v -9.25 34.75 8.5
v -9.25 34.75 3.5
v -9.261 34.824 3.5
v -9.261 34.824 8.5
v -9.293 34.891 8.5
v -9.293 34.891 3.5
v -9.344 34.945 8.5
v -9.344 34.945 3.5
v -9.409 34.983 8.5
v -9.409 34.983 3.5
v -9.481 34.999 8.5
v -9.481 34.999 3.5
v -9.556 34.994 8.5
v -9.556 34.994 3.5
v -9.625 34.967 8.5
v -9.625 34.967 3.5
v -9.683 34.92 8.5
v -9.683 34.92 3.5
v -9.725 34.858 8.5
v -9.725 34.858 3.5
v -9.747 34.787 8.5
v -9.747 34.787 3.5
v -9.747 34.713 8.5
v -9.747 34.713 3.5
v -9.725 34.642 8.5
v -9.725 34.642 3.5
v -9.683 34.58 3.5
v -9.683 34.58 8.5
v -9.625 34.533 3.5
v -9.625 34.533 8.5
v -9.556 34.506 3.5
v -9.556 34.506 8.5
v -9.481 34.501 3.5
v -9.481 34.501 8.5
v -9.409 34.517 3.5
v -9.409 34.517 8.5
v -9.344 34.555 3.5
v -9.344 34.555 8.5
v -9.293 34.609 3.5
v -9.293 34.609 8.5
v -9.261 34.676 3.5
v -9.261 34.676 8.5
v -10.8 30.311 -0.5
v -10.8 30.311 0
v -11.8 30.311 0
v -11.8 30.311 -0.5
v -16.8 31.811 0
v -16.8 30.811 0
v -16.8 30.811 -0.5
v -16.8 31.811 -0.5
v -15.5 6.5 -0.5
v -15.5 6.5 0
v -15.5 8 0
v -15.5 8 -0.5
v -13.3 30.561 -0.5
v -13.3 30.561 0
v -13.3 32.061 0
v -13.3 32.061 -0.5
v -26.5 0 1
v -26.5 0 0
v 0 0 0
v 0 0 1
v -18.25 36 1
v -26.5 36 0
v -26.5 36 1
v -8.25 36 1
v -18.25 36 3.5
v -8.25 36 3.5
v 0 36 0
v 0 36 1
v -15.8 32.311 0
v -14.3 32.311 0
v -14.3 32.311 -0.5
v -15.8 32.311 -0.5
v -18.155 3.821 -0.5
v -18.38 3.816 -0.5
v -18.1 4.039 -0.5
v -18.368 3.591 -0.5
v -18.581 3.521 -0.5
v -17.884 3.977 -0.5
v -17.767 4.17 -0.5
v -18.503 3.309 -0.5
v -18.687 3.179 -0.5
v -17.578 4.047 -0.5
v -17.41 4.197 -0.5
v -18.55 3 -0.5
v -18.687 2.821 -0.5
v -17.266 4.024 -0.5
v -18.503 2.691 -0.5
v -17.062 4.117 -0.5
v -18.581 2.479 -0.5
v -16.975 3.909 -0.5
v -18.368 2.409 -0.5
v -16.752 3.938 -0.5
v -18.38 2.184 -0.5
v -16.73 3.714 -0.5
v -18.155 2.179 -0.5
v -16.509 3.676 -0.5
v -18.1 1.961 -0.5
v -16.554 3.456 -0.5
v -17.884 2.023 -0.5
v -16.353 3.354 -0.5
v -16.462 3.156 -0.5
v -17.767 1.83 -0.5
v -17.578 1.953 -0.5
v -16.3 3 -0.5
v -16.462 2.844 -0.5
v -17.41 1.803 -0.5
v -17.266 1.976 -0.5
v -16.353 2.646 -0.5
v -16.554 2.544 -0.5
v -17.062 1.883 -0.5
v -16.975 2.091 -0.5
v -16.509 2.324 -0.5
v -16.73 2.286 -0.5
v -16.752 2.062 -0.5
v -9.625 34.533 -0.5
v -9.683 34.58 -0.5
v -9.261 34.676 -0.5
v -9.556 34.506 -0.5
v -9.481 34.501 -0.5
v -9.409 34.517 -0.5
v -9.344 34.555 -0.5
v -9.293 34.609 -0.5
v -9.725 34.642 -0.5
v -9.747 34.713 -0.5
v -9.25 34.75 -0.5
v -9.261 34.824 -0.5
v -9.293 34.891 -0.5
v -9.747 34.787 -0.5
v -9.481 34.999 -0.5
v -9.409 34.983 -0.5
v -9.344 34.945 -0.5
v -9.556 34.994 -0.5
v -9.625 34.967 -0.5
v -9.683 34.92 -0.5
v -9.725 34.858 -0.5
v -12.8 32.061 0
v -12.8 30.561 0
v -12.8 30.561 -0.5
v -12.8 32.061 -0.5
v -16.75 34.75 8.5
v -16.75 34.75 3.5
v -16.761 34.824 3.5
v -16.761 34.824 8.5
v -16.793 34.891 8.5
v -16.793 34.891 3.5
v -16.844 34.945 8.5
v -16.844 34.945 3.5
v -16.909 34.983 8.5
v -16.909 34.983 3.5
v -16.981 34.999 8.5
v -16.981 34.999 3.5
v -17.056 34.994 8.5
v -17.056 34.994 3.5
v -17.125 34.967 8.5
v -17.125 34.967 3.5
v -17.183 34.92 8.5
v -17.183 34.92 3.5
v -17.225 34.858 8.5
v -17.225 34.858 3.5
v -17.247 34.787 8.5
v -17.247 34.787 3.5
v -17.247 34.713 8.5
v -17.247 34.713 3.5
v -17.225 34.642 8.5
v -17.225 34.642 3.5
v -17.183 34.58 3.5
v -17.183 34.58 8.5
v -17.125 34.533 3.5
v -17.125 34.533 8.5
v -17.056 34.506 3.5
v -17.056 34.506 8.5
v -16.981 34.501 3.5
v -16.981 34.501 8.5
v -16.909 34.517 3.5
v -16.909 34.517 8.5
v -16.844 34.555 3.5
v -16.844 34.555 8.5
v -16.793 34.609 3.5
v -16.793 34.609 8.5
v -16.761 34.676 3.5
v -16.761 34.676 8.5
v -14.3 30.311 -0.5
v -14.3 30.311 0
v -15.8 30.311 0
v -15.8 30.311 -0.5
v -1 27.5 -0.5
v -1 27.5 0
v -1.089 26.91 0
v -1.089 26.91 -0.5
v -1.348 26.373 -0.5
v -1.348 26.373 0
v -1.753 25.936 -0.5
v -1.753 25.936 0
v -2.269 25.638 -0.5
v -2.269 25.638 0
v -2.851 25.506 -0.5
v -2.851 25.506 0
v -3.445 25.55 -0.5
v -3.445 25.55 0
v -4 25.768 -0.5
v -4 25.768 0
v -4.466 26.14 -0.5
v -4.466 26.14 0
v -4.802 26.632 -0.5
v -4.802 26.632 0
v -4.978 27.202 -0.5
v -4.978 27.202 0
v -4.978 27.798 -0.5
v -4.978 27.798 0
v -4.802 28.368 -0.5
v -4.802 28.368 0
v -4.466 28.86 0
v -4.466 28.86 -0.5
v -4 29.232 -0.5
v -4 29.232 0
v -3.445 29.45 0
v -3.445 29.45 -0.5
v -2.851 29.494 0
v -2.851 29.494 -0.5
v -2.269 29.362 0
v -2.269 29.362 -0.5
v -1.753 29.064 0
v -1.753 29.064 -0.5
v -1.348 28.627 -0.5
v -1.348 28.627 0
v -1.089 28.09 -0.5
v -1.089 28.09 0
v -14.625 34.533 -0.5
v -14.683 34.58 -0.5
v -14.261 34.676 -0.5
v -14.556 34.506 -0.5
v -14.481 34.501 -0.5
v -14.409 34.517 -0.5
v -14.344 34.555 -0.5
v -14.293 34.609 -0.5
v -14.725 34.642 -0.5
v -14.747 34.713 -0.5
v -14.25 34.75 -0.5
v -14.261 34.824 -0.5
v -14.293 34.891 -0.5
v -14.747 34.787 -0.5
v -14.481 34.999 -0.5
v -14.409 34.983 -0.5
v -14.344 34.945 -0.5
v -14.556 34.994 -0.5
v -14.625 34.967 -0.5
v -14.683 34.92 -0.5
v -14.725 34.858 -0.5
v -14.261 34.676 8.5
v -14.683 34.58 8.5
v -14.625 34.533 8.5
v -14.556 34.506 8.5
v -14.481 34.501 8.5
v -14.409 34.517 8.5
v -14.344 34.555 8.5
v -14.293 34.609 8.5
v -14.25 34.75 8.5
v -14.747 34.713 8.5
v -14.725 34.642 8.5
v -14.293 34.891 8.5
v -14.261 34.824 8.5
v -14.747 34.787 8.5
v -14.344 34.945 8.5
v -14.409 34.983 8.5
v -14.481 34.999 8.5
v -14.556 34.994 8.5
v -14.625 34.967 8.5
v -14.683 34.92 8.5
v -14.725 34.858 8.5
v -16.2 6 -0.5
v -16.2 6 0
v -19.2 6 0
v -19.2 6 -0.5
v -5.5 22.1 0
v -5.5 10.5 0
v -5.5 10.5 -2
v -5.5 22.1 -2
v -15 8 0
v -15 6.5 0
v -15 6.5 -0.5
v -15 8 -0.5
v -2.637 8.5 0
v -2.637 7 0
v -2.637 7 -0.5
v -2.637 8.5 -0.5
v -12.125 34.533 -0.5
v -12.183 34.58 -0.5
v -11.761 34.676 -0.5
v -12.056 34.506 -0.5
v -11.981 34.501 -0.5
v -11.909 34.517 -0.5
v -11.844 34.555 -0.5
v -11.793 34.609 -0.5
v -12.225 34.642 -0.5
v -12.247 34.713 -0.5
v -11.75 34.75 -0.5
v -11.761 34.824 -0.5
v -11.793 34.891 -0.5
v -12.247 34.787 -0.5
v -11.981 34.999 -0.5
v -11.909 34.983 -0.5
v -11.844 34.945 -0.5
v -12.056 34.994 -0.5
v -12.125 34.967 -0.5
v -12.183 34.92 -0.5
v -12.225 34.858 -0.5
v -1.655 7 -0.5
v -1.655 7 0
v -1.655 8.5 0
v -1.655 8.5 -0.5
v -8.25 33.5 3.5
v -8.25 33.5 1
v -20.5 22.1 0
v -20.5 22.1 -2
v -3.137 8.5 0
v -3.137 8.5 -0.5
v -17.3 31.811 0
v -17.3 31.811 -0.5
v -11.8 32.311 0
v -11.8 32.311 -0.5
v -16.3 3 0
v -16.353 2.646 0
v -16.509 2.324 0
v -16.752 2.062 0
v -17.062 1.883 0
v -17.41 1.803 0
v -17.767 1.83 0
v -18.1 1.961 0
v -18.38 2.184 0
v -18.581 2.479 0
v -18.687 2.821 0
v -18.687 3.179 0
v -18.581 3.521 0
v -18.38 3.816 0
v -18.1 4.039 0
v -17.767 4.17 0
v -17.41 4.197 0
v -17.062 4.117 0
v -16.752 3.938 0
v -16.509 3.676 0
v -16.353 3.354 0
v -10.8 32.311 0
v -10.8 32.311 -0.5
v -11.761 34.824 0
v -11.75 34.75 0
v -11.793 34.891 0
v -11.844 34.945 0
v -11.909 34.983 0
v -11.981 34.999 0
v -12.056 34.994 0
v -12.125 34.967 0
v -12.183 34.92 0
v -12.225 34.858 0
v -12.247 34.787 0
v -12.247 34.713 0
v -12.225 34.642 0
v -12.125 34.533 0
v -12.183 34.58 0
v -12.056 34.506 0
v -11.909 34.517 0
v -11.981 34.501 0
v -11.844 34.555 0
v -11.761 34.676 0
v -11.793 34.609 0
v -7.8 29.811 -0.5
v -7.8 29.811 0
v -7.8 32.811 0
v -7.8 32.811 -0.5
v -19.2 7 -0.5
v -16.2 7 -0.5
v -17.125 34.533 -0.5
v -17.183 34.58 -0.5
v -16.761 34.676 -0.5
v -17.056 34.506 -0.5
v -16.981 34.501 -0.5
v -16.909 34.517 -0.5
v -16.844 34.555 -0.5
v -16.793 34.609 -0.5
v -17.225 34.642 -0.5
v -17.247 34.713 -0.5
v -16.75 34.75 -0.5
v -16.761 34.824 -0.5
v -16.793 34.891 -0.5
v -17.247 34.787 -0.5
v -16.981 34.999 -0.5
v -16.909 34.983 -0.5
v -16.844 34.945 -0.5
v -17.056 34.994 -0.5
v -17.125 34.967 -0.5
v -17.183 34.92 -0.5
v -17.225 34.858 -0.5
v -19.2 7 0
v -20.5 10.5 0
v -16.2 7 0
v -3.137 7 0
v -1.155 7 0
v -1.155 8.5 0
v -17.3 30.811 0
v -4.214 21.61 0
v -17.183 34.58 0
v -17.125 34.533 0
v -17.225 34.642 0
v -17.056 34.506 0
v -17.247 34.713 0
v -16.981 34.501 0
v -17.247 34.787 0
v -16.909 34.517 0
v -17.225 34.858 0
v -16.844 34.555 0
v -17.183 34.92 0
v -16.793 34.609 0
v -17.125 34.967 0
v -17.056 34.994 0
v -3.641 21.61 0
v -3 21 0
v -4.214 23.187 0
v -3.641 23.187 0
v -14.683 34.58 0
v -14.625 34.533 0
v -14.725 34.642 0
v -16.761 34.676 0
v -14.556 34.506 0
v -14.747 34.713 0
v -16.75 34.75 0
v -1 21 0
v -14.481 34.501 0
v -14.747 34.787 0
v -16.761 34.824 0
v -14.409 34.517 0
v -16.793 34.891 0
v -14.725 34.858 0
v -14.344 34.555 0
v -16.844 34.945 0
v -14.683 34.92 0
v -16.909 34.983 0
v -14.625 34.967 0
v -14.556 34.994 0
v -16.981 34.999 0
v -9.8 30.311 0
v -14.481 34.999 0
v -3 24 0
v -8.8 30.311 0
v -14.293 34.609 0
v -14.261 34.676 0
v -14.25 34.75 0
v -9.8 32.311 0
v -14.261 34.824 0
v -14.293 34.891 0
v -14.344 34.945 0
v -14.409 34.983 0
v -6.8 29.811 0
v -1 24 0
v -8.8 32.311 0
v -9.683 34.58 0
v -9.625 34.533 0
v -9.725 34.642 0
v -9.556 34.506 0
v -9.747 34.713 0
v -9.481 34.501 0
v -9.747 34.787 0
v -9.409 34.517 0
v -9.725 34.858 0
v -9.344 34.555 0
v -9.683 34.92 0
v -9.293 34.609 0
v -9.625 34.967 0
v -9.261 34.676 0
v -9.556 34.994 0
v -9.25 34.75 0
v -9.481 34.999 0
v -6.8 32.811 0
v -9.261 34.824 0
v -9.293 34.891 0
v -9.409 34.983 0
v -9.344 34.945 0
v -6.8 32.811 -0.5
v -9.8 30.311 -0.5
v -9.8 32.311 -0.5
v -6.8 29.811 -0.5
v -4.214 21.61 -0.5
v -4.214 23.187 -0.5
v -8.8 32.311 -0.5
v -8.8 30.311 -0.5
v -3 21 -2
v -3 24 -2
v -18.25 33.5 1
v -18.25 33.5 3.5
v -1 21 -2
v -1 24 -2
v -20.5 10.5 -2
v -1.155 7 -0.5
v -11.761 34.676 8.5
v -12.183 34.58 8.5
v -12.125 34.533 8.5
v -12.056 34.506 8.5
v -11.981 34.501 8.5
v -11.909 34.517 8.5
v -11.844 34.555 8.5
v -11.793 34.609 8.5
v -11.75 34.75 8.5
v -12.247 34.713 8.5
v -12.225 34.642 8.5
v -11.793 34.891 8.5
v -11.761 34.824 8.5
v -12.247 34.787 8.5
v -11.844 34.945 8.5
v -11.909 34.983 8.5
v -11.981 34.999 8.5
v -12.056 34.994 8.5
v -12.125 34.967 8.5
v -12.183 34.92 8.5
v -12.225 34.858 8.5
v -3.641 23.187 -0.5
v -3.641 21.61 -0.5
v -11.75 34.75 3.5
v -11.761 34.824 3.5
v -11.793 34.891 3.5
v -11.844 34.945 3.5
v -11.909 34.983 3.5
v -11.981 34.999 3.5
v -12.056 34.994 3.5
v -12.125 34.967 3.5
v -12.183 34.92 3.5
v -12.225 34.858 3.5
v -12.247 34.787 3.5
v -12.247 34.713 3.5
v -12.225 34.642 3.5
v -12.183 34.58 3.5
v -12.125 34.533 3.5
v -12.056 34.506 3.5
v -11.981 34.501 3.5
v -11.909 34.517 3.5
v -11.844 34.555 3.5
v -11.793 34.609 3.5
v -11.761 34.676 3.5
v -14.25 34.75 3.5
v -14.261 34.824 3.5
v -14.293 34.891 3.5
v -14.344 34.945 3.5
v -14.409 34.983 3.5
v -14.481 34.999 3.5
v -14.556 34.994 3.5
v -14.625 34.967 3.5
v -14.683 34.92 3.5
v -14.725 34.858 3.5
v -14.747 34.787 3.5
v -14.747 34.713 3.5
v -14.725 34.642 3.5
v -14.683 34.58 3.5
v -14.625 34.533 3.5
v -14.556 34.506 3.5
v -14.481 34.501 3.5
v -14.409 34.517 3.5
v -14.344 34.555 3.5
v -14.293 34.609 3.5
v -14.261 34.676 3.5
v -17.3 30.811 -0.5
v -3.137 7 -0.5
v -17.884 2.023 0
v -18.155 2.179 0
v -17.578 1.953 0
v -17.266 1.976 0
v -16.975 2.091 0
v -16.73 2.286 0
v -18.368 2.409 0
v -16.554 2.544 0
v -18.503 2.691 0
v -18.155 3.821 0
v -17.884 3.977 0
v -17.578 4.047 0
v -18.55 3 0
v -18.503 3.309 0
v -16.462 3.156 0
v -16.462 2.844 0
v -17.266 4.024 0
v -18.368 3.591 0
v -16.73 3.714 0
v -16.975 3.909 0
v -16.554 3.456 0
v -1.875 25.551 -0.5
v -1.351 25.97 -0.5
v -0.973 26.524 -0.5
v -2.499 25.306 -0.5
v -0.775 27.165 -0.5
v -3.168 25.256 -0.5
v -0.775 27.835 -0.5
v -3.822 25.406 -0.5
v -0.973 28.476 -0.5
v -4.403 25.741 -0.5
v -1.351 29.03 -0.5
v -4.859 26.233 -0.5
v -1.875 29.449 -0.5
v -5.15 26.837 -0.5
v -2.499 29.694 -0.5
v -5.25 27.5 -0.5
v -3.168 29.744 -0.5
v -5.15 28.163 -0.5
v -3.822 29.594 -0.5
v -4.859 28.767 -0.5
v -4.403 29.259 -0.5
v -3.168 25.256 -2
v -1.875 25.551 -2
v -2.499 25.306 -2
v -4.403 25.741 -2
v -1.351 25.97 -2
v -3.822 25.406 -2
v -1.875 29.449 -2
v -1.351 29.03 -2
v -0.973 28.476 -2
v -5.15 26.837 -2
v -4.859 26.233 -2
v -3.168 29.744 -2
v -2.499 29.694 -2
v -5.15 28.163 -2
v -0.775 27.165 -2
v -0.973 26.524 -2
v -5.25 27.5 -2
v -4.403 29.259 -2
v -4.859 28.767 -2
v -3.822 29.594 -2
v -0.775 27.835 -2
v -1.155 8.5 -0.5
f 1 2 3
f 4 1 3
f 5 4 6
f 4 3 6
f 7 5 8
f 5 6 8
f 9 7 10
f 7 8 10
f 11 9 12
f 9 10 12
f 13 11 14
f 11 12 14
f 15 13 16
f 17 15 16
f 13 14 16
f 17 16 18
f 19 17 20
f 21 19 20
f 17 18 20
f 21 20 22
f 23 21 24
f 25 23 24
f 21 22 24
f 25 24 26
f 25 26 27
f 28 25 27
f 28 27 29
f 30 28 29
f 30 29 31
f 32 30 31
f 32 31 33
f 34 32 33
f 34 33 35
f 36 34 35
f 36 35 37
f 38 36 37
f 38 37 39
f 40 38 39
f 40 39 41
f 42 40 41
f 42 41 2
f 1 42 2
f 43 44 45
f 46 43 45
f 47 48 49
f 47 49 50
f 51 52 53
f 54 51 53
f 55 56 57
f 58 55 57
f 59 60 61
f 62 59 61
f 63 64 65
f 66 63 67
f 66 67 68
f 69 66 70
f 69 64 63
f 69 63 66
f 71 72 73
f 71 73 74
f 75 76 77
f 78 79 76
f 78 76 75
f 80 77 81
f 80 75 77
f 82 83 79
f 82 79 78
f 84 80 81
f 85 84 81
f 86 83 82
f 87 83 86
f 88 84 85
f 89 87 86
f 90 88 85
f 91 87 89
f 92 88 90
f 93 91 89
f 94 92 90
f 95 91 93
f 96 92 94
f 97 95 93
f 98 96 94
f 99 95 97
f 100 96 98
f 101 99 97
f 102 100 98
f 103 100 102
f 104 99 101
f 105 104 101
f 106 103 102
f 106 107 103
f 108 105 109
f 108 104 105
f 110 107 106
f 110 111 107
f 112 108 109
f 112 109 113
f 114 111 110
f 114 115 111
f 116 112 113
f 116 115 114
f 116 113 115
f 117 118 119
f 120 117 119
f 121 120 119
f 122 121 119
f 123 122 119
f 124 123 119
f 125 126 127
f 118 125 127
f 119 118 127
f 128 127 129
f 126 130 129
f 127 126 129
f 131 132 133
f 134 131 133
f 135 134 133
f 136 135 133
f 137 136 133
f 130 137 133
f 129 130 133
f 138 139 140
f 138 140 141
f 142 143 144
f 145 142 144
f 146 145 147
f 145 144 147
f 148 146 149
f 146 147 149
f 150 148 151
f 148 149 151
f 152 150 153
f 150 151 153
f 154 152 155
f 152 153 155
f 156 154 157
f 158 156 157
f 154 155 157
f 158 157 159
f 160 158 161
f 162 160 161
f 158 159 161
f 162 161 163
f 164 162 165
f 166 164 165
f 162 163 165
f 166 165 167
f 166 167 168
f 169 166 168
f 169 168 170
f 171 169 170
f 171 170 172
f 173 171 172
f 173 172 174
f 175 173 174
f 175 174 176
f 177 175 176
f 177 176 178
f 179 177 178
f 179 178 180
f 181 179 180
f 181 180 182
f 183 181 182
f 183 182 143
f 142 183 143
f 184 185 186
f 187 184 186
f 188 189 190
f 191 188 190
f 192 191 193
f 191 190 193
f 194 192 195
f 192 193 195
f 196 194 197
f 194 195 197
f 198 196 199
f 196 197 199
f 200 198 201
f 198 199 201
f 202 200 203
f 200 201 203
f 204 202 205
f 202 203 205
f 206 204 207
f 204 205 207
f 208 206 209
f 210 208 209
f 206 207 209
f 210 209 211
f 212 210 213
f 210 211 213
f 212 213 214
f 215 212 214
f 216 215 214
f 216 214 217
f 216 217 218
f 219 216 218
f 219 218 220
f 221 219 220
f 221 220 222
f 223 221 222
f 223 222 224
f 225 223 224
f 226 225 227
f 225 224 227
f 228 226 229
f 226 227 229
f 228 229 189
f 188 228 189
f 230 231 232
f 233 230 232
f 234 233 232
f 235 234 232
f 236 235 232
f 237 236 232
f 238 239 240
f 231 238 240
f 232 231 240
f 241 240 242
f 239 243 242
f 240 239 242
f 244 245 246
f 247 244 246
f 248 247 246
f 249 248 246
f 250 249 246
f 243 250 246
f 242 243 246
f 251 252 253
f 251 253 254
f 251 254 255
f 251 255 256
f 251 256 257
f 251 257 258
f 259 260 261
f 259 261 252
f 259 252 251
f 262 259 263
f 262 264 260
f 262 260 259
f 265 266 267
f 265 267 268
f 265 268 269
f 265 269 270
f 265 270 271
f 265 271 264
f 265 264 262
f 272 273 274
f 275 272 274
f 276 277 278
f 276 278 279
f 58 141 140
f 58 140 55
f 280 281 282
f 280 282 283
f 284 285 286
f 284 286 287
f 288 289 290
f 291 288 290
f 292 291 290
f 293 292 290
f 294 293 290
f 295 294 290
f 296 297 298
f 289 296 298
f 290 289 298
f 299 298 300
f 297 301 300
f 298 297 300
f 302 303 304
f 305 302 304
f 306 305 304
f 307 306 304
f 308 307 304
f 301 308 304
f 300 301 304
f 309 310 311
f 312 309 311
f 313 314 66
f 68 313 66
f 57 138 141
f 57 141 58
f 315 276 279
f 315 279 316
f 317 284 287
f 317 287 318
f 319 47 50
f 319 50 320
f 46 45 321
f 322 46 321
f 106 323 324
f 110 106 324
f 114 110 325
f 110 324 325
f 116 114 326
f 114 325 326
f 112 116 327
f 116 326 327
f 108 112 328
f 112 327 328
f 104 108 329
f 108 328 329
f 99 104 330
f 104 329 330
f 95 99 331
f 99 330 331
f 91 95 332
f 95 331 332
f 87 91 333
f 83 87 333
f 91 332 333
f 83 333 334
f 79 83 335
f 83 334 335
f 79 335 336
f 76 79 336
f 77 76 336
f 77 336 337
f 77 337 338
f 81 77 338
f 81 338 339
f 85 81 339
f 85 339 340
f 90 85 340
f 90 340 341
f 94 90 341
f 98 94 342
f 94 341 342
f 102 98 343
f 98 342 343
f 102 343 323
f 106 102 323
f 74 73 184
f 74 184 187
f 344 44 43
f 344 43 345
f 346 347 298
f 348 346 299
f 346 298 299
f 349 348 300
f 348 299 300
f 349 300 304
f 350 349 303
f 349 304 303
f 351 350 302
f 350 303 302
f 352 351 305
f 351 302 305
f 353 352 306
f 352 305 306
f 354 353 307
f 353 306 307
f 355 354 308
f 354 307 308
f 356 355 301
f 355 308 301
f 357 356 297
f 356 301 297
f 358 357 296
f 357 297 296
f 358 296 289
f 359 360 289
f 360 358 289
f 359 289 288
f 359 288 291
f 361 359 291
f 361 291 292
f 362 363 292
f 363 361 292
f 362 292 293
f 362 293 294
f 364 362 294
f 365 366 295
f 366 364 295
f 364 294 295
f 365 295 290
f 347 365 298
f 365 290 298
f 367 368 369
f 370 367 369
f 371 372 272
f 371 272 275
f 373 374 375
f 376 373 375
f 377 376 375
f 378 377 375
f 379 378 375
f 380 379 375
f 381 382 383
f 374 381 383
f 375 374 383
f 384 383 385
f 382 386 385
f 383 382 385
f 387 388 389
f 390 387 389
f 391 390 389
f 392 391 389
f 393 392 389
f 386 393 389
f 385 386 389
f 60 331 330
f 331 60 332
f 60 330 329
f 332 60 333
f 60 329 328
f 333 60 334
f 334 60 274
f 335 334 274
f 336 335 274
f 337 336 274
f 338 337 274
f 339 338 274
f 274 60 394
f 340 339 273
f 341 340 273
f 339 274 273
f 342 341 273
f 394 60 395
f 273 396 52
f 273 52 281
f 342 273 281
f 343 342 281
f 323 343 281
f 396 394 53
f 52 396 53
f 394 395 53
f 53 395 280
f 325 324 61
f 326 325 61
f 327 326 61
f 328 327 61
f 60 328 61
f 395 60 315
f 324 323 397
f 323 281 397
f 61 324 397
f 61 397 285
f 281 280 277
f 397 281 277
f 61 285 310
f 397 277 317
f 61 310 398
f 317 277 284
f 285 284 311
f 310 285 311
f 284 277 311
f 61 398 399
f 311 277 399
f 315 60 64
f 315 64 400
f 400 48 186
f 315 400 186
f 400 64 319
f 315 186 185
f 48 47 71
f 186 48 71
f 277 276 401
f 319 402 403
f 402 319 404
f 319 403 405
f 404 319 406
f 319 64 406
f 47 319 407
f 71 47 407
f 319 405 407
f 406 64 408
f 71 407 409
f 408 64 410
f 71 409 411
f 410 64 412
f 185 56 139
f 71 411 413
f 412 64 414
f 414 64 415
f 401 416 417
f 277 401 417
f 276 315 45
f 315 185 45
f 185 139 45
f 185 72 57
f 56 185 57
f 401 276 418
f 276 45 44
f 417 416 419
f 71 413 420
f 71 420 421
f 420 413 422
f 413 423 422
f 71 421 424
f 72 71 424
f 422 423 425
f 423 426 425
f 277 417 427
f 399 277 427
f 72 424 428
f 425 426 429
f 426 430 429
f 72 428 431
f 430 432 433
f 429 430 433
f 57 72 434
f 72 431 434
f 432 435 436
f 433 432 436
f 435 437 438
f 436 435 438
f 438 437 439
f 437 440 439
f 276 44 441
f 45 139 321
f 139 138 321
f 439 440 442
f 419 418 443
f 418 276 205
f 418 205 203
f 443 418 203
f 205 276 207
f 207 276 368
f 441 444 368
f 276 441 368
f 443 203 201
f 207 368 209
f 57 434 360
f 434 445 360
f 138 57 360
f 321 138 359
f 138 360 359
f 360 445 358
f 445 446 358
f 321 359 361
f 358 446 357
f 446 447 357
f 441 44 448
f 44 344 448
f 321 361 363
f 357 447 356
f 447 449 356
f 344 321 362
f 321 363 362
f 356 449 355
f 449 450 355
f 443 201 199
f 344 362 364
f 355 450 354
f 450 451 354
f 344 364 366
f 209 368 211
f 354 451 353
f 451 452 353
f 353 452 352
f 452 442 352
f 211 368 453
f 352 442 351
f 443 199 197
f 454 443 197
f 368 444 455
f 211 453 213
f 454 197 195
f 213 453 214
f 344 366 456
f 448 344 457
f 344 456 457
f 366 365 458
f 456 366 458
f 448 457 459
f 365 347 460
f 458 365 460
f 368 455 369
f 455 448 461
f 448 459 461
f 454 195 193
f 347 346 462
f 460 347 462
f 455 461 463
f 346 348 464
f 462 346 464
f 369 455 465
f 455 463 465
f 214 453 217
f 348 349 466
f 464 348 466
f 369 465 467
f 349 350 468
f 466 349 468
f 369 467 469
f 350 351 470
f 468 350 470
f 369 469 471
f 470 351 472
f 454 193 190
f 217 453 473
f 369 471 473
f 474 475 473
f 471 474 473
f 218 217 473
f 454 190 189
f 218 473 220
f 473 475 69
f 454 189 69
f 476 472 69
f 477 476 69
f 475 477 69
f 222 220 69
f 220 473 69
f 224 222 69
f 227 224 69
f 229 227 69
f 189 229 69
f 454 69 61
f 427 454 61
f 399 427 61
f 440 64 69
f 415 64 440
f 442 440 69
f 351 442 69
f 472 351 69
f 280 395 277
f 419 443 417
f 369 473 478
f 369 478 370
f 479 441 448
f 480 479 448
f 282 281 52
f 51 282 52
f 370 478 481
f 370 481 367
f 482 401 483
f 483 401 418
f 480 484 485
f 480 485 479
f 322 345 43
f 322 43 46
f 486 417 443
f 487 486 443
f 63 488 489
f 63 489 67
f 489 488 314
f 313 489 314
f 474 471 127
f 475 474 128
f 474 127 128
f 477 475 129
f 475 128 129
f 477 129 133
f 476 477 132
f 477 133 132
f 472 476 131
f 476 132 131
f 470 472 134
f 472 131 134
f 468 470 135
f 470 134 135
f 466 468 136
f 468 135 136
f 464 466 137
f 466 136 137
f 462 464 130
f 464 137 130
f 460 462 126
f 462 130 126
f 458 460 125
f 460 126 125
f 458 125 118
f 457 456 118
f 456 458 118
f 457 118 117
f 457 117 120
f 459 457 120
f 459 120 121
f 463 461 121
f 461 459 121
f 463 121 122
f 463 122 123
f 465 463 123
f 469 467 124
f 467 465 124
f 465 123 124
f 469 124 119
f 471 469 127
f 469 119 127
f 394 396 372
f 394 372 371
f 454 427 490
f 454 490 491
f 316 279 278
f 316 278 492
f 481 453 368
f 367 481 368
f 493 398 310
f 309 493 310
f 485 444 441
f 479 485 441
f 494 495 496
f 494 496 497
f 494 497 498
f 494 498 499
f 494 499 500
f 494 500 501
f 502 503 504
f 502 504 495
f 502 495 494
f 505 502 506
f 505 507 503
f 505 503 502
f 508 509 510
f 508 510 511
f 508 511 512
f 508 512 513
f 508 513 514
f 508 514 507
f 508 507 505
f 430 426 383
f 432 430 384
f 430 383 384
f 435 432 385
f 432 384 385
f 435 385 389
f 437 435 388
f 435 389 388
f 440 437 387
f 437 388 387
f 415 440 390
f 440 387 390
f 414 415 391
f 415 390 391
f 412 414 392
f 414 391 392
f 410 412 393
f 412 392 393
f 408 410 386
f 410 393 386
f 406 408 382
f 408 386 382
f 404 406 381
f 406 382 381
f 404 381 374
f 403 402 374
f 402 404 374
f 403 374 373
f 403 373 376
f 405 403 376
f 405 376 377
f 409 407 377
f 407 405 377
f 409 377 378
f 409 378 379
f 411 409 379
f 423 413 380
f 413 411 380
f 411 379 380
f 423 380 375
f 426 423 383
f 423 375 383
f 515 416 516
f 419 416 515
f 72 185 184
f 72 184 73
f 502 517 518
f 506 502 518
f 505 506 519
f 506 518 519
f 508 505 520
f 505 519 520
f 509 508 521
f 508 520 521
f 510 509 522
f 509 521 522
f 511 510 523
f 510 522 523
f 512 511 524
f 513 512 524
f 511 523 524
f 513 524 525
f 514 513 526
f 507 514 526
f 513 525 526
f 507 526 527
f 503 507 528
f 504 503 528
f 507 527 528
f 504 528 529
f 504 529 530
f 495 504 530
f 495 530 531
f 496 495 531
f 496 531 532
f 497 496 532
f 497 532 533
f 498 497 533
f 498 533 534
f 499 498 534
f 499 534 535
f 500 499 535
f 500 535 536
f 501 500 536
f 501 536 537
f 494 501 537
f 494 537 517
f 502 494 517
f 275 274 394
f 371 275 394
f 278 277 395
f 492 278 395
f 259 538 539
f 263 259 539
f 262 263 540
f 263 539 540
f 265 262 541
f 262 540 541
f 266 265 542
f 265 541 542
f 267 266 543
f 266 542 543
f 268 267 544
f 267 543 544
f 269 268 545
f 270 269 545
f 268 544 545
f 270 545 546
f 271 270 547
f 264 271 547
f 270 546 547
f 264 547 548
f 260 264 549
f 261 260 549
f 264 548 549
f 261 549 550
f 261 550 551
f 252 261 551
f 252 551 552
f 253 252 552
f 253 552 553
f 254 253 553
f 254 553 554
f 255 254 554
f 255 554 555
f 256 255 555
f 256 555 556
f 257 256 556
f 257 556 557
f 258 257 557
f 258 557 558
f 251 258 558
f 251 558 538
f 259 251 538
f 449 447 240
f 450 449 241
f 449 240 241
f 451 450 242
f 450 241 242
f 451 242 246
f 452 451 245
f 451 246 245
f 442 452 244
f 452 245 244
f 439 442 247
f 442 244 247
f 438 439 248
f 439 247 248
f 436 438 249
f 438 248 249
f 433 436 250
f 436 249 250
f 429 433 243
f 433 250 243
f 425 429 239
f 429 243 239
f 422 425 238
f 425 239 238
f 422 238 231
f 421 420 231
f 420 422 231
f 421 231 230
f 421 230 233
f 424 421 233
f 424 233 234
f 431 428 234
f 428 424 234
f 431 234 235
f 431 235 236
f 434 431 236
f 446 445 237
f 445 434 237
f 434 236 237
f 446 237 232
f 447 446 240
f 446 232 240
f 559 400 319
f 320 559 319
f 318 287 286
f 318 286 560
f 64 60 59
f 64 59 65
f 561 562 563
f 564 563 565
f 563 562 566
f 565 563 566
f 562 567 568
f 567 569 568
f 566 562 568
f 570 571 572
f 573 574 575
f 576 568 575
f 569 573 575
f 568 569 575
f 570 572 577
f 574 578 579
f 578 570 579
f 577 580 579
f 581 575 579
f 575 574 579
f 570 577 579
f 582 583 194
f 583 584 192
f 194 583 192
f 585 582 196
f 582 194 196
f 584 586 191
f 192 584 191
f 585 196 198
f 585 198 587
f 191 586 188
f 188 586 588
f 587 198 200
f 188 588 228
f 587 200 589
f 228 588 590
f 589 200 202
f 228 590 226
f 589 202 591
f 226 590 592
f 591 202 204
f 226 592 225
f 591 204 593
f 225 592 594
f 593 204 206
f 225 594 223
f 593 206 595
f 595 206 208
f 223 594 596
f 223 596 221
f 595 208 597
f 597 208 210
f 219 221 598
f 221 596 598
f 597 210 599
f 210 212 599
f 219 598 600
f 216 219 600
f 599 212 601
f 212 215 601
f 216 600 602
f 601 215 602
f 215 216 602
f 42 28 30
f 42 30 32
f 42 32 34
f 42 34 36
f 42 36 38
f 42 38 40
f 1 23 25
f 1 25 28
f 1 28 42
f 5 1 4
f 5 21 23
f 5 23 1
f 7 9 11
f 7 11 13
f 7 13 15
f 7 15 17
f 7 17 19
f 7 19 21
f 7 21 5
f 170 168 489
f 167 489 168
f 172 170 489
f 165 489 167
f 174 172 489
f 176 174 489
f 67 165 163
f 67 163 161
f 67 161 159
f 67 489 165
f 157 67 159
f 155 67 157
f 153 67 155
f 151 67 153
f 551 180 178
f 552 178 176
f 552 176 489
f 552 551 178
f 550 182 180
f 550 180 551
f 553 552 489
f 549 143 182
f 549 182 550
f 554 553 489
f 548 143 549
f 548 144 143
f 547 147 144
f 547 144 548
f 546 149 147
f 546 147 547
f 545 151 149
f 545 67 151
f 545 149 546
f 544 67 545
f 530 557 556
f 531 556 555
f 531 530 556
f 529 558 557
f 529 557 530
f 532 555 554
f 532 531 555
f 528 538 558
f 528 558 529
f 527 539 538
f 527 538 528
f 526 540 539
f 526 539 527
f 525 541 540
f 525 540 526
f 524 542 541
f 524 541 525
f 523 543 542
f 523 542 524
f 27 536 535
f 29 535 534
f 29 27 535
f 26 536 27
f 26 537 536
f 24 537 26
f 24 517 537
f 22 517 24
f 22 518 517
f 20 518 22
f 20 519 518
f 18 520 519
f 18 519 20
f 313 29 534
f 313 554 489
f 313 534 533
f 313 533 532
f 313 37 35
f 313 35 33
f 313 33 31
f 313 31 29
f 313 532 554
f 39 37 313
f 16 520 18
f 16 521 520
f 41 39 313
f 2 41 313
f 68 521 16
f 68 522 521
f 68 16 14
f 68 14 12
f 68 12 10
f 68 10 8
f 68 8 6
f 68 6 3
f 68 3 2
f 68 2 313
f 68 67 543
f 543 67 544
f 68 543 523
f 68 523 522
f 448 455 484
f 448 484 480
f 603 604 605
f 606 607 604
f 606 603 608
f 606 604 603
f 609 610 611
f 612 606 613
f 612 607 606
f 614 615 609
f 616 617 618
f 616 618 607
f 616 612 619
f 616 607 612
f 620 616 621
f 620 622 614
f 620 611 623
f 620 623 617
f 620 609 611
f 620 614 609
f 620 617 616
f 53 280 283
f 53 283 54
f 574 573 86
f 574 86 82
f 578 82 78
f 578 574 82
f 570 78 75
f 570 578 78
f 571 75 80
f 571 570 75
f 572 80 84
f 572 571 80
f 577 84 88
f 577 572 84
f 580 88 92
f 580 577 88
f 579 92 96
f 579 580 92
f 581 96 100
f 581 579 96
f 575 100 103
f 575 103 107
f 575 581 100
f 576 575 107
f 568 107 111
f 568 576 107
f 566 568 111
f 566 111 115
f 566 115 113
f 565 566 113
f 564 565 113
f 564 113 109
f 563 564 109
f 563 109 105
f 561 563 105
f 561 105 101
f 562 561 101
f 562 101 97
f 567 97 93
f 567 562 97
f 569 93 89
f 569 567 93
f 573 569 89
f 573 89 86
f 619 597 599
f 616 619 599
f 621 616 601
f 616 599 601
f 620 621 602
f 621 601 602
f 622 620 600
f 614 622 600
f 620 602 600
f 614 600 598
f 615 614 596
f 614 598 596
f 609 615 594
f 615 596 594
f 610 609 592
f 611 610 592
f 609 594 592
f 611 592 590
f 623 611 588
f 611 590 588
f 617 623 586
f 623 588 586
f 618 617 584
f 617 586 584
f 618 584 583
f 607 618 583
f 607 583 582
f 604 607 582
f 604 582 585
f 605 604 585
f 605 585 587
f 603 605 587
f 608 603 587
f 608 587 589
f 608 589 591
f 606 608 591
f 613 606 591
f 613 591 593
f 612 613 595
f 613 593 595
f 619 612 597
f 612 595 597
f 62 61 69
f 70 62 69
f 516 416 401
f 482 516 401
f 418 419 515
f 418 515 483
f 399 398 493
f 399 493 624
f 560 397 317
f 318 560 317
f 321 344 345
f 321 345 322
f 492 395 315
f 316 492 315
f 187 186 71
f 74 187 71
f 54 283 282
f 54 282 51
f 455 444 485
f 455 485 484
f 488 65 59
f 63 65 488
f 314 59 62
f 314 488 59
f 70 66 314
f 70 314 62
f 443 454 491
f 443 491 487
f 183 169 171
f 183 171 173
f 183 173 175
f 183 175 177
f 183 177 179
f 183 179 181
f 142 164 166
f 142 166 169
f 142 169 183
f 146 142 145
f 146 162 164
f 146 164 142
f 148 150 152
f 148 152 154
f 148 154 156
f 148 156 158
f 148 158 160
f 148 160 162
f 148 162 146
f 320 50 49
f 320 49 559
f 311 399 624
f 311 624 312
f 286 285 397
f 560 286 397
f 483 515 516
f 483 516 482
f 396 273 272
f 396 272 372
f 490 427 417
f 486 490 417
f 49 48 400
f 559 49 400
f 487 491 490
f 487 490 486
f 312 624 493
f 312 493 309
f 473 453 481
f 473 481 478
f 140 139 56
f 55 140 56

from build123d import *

# Parameters (mm, degrees)
ESQUISSE1_W             = 26.5
ESQUISSE1_H             = 36
BOSS_EXTRU_1_DEPTH      = 1
ESQUISSE2_W             = 10
ESQUISSE2_H             = 2.5
BOSS_EXTRU_2_DEPTH      = 2.5
BOSS_EXTRU_3_DEPTH      = 5
BOSS_EXTRU_3_DEPTH_BACK = 4
ESQUISSE3_R             = 0.25
ESQUISSE4_W             = 1
ESQUISSE4_H             = 3
ESQUISSE4_H_2           = 2
ESQUISSE4_W_2           = 0.5
ESQUISSE4_H_3           = 1.5
ESQUISSE4_W_3           = 1.5
ESQUISSE4_H_4           = 1
BOSS_EXTRU_4_DEPTH      = 0.5
ESQUISSE5_R             = 2
BOSS_EXTRU_5_DEPTH      = 0.5
ESQUISSE6_R             = 2.25
BOSS_EXTRU_6_DEPTH      = 1.5
ESQUISSE7_W             = 15
ESQUISSE7_H             = 11.6
ESQUISSE7_W_2           = 2
ESQUISSE7_H_2           = 3
BOSS_EXTRU_7_DEPTH      = 2
ESQUISSE8_R             = 1.2
ESQUISSE8_R_2           = 1.05
ESQUISSE8_W             = 0.573696965
ESQUISSE8_H             = 1.577666654
ESQUISSE8_W_2           = 0.5
ESQUISSE8_H_2           = 1.5
ESQUISSE8_W_3           = 3
ESQUISSE8_H_3           = 1
BOSS_EXTRU_8_DEPTH      = 0.5


with BuildPart() as part:
    # Esquisse1 → Boss.-Extru.1 (new body)
    with BuildSketch(Plane.XY):
        with Locations((-13.25, 18)):
            Rectangle(ESQUISSE1_W, ESQUISSE1_H)
    extrude(amount=BOSS_EXTRU_1_DEPTH)

    # Esquisse2 → Boss.-Extru.2 (add)
    with BuildSketch(Plane.XY.offset(1)):
        with Locations((-13.25, 34.75)):
            Rectangle(ESQUISSE2_W, ESQUISSE2_H)
    extrude(amount=BOSS_EXTRU_2_DEPTH)

    # Esquisse3 → Boss.-Extru.3 (add, two sides: drawn at the far end of the back side and taken through both)
    with BuildSketch(Plane.XY.offset(3.5).offset(-BOSS_EXTRU_3_DEPTH_BACK)):
        with Locations((-17, 34.75)):
            Circle(ESQUISSE3_R)
        with Locations((-14.5, 34.75)):
            Circle(ESQUISSE3_R)
        with Locations((-12, 34.75)):
            Circle(ESQUISSE3_R)
        with Locations((-9.5, 34.75)):
            Circle(ESQUISSE3_R)
    extrude(amount=BOSS_EXTRU_3_DEPTH + BOSS_EXTRU_3_DEPTH_BACK)

    # Esquisse4 → Boss.-Extru.4 (add)
    with BuildSketch(Plane(origin=(0, 0, 0), x_dir=(-1, 0, 0), z_dir=(0, 0, -1))):
        with Locations((7.3, 31.311243574)):
            Rectangle(ESQUISSE4_W, ESQUISSE4_H)
        with Locations((9.3, 31.311243574)):
            Rectangle(ESQUISSE4_W, ESQUISSE4_H_2)
        with Locations((11.3, 31.311243574)):
            Rectangle(ESQUISSE4_W, ESQUISSE4_H_2)
        with Locations((13.05, 31.311243574)):
            Rectangle(ESQUISSE4_W_2, ESQUISSE4_H_3)
        with Locations((15.05, 31.311243574)):
            Rectangle(ESQUISSE4_W_3, ESQUISSE4_H_2)
        with Locations((17.05, 31.311243574)):
            Rectangle(ESQUISSE4_W_2, ESQUISSE4_H_4)
    extrude(amount=BOSS_EXTRU_4_DEPTH)

    # Esquisse5 → Boss.-Extru.5 (add)
    with BuildSketch(Plane(origin=(0, 0, 0), x_dir=(-1, 0, 0), z_dir=(0, 0, -1))):
        with Locations(Location((3, 27.5, 0), (0, 0, 180))):
            Circle(ESQUISSE5_R)
    extrude(amount=BOSS_EXTRU_5_DEPTH)

    # Esquisse6 → Boss.-Extru.6 (add)
    with BuildSketch(Plane(origin=(0, 0, -0.5), x_dir=(-1, 0, 0), z_dir=(0, 0, -1))):
        with Locations((3, 27.5)):
            Circle(ESQUISSE6_R)
    extrude(amount=BOSS_EXTRU_6_DEPTH)

    # Esquisse7 → Boss.-Extru.7 (add)
    with BuildSketch(Plane(origin=(0, 0, 0), x_dir=(-1, 0, 0), z_dir=(0, 0, -1))):
        with Locations((13, 16.3)):
            Rectangle(ESQUISSE7_W, ESQUISSE7_H)
        with Locations((2, 22.5)):
            Rectangle(ESQUISSE7_W_2, ESQUISSE7_H_2)
    extrude(amount=BOSS_EXTRU_7_DEPTH)

    # Esquisse8 → Boss.-Extru.8 (add)
    # profile 1 of 6: a face of its own
    with BuildSketch(Plane(origin=(0, 0, 0), x_dir=(-1, 0, 0), z_dir=(0, 0, -1))):
        with Locations(Location((17.5, 3, 0), (0, 0, 180))):
            Circle(ESQUISSE8_R)
        with Locations((17.5, 3)):
            Circle(ESQUISSE8_R_2, mode=Mode.SUBTRACT)
    # profile 2 of 6: a face of its own
    with BuildSketch(Plane(origin=(0, 0, 0), x_dir=(-1, 0, 0), z_dir=(0, 0, -1))):
        with Locations((3.927424315, 22.3983434)):
            Rectangle(ESQUISSE8_W, ESQUISSE8_H)
    # profile 3 of 6: a face of its own
    with BuildSketch(Plane(origin=(0, 0, 0), x_dir=(-1, 0, 0), z_dir=(0, 0, -1))):
        with Locations((1.404555649, 7.75)):
            Rectangle(ESQUISSE8_W_2, ESQUISSE8_H_2)
    # profile 4 of 6: a face of its own
    with BuildSketch(Plane(origin=(0, 0, 0), x_dir=(-1, 0, 0), z_dir=(0, 0, -1))):
        with Locations((2.886606143, 7.75)):
            Rectangle(ESQUISSE8_W_2, ESQUISSE8_H_2)
    # profile 5 of 6: a face of its own
    with BuildSketch(Plane(origin=(0, 0, 0), x_dir=(-1, 0, 0), z_dir=(0, 0, -1))):
        with Locations((15.25, 7.25)):
            Rectangle(ESQUISSE8_W_2, ESQUISSE8_H_2)
    # profile 6 of 6: a face of its own
    with BuildSketch(Plane(origin=(0, 0, 0), x_dir=(-1, 0, 0), z_dir=(0, 0, -1))):
        with Locations((17.7, 6.5)):
            Rectangle(ESQUISSE8_W_3, ESQUISSE8_H_3)
    extrude(amount=BOSS_EXTRU_8_DEPTH)


solid = part.part
